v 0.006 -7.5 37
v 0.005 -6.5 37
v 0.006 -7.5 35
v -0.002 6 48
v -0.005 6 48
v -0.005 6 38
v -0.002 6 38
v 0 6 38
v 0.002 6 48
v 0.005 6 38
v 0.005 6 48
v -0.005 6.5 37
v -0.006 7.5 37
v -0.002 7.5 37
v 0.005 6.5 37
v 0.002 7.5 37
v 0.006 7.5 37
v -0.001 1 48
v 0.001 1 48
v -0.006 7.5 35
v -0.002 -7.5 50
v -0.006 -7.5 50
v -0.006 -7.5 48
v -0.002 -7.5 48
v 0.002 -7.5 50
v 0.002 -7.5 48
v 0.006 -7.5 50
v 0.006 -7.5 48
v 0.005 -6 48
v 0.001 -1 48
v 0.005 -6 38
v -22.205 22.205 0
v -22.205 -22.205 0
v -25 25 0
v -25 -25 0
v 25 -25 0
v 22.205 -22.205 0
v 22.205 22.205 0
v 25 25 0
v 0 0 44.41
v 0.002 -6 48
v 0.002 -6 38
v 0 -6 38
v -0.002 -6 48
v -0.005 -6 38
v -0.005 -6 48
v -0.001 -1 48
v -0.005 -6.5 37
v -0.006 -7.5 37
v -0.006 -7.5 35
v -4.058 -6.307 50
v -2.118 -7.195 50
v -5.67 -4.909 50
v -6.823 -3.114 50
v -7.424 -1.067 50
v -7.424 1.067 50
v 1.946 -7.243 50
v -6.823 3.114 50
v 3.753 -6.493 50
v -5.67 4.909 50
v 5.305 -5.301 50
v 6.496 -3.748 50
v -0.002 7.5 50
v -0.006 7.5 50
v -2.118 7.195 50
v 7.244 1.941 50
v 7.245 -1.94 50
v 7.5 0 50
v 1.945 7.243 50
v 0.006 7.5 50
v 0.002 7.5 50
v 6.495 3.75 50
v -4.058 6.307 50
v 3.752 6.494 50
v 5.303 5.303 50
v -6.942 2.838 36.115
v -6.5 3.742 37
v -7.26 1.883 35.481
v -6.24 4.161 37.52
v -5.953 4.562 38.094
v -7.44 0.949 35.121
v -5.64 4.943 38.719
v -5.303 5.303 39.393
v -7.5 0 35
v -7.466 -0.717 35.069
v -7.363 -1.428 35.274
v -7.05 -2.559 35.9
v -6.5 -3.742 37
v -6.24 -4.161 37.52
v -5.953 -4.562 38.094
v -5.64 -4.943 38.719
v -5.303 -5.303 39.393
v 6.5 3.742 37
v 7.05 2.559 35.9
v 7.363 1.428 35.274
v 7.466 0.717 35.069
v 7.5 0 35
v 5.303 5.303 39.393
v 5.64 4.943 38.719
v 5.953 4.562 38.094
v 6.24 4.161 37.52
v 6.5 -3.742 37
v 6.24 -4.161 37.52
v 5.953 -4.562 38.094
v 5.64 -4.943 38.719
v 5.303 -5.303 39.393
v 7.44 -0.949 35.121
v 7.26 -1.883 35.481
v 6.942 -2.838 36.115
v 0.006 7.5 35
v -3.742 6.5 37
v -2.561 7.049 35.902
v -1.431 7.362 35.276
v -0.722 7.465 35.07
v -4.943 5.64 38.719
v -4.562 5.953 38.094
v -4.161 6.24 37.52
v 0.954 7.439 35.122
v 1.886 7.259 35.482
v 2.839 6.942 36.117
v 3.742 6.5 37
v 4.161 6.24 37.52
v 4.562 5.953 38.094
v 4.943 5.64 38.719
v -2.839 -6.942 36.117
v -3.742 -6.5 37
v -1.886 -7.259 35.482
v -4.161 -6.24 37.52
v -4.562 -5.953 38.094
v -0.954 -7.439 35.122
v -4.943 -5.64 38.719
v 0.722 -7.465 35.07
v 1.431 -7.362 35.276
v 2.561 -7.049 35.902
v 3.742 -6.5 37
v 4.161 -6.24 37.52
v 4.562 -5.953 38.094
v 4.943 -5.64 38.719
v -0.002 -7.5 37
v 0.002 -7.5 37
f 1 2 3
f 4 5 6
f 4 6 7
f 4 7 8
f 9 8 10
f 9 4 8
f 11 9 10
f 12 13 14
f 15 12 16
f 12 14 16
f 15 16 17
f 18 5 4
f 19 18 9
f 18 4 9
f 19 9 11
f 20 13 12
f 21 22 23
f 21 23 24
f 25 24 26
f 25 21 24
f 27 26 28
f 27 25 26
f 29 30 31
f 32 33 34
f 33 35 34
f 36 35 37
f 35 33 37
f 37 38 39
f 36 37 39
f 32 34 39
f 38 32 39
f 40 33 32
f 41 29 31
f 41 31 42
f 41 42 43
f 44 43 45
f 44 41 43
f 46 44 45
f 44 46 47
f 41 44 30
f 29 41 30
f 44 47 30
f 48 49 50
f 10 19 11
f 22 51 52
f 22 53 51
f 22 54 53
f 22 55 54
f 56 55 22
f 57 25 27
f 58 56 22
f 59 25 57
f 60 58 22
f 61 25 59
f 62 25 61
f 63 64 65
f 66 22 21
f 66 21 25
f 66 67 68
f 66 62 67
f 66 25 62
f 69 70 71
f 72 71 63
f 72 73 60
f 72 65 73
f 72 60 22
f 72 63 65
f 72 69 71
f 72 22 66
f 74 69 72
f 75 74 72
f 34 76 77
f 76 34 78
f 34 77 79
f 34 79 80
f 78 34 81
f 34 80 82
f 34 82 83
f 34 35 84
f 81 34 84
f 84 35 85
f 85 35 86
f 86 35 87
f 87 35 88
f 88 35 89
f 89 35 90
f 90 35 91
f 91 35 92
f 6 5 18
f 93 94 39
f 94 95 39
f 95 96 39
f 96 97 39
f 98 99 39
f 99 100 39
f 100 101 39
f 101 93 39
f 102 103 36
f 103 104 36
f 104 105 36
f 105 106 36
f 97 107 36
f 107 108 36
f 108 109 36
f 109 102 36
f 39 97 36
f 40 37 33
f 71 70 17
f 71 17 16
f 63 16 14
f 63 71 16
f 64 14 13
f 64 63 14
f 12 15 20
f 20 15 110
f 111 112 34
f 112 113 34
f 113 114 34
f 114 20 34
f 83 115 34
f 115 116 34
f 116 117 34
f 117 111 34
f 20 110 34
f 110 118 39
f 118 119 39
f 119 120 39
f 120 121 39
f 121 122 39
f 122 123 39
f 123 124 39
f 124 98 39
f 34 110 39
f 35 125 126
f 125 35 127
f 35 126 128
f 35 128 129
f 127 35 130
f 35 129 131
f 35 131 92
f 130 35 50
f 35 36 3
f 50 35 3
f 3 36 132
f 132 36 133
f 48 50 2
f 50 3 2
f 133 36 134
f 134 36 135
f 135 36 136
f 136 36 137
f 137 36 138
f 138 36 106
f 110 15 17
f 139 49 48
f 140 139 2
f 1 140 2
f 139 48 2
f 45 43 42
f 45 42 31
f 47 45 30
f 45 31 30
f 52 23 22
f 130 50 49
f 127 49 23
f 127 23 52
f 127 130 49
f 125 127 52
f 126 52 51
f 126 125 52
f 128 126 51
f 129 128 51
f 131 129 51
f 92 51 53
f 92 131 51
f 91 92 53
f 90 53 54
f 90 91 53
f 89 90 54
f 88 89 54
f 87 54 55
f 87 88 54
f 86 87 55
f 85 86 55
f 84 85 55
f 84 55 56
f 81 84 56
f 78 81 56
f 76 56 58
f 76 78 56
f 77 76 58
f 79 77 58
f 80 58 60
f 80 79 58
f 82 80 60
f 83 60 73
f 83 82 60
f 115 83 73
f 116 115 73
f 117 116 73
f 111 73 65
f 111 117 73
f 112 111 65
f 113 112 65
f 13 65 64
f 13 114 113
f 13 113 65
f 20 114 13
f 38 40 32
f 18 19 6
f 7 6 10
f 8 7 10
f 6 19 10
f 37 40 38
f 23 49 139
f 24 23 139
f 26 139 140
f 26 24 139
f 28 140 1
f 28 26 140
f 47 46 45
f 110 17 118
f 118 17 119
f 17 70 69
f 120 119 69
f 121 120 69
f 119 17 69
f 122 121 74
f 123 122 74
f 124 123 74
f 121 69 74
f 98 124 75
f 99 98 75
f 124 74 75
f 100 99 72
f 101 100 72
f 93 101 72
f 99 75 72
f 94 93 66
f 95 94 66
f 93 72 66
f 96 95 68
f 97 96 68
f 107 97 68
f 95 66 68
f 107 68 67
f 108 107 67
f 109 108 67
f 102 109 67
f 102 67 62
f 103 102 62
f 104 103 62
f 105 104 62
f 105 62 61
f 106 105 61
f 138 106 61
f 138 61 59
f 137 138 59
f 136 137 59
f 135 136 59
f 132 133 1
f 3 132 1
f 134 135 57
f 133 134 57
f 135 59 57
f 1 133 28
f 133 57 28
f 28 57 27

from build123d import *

# Parameters (mm, degrees)
F0_W          = 50
F0_H          = 50
F1_DEPTH      = 50
F4_DEPTH      = 50
F5_DEPTH      = 51
F6_T          = -2.5
F8_ANGLE_BACK = 89.955
F8_ANGLE      = 179.91
F10_DEPTH     = 2
F12_DEPTH     = 13


with BuildPart() as f1:
    # F0 (on Top) → F1 (new body)
    with BuildSketch(Plane.XY):
        Rectangle(F0_W, F0_H)
    extrude(amount=F1_DEPTH)

    # F3 (on face) → F4 (cut, through all)
    with BuildSketch(Plane.YZ.offset(25)):
        Polygon((-25, 1.3375796843), (-25, 0), (0, 50), (-25, 50), align=None)
        Polygon((25, 50), (0, 50), (25, 0), align=None)
    extrude(amount=-F4_DEPTH, mode=Mode.SUBTRACT)

    # F2 (on face) → F5 (cut, up to face)
    with BuildSketch(Plane.XZ.offset(25)):
        Polygon((-25, 50), (-25, 0), (0, 50), align=None)
        Polygon((25, 50), (0, 50), (25, 0), align=None)
    extrude(amount=-F5_DEPTH, mode=Mode.SUBTRACT)

    # F6
    f6_openings = [f1.faces().sort_by_distance(p)[0] for p in [
        (0, 0, 0),
    ]]
    offset(amount=F6_T, openings=f6_openings)

    # F7 (on Front) → F8 (revolve)
    with BuildSketch(Plane.XZ, mode=Mode.PRIVATE) as f8_sk:
        Polygon((-7.5, 50), (-7.5, 35), (0, 50), align=None)
        Polygon((7.5, 50), (0, 50), (7.5, 35), align=None)
    revolve(f8_sk.sketch.rotate(Axis((0, 0, 42.5), (0, 0, -1)), -F8_ANGLE_BACK), axis=Axis((0, 0, 42.5), (0, 0, -1)), revolution_arc=F8_ANGLE)

    # F9 (on face) → F10 (join)
    with BuildSketch(Plane.XY.offset(50)):
        with BuildLine():
            Line((0, 0), (0.0058904856, 7.4999976868))
            ThreePointArc((0.0058904856, 7.4999976868), (0, 7.5), (-0.0058904856, 7.4999976868))
            Line((-0.0058904856, 7.4999976868), (0, 0))
        make_face()
        with BuildLine():
            ThreePointArc((-5.3033008589, 5.3033008589), (-2.8701257427, -6.9290964938), (7.5, 0))
            ThreePointArc((7.5, 0), (6.9290964938, 2.8701257427), (5.3033008589, 5.3033008589))
            ThreePointArc((5.3033008589, 5.3033008589), (2.8728465712, 6.9279688638), (0.0058904856, 7.4999976868))
            Line((0.0058904856, 7.4999976868), (0, 0))
            Line((0, 0), (-0.0058904856, 7.4999976868))
            ThreePointArc((-0.0058904856, 7.4999976868), (-2.8728465712, 6.9279688638), (-5.3033008589, 5.3033008589))
        make_face()
    extrude(amount=-F10_DEPTH)

    # F11 (on face) → F12 (join)
    with BuildSketch(Plane.XY.offset(50)):
        with BuildLine():
            ThreePointArc((-0.0047123885, 5.9999981494), (0, 6), (0.0047123885, 5.9999981494))
            Line((0.0047123885, 5.9999981494), (0.0058904856, 7.4999976868))
            ThreePointArc((0.0058904856, 7.4999976868), (0, 7.5), (-0.0058904856, 7.4999976868))
            Line((-0.0058904856, 7.4999976868), (-0.0047123885, 5.9999981494))
        make_face()
        with BuildLine():
            ThreePointArc((-0.0047123885, -5.9999981494), (-6, 0), (-0.0047123885, 5.9999981494))
            Line((-0.0047123885, 5.9999981494), (-0.0058904856, 7.4999976868))
            ThreePointArc((-0.0058904856, 7.4999976868), (-7.5, 0), (-0.0058904856, -7.4999976868))
            Line((-0.0058904856, -7.4999976868), (-0.0047123885, -5.9999981494))
        make_face()
        with BuildLine():
            Line((0.0058904856, -7.4999976868), (0.0047123885, -5.9999981494))
            ThreePointArc((0.0047123885, -5.9999981494), (0, -6), (-0.0047123885, -5.9999981494))
            Line((-0.0047123885, -5.9999981494), (-0.0058904856, -7.4999976868))
            ThreePointArc((-0.0058904856, -7.4999976868), (0, -7.5), (0.0058904856, -7.4999976868))
        make_face()
        with BuildLine():
            ThreePointArc((0.0047123885, 5.9999981494), (4.244306441, 4.2409742789), (6, 0))
            ThreePointArc((6, 0), (4.244306441, -4.2409742789), (0.0047123885, -5.9999981494))
            Line((0.0047123885, -5.9999981494), (0.0058904856, -7.4999976868))
            ThreePointArc((0.0058904856, -7.4999976868), (5.3053830513, -5.3012178487), (7.5, 0))
            ThreePointArc((7.5, 0), (5.3053830513, 5.3012178487), (0.0058904856, 7.4999976868))
            Line((0.0058904856, 7.4999976868), (0.0047123885, 5.9999981494))
        make_face()
    extrude(amount=-F12_DEPTH)


solid = f1.part
